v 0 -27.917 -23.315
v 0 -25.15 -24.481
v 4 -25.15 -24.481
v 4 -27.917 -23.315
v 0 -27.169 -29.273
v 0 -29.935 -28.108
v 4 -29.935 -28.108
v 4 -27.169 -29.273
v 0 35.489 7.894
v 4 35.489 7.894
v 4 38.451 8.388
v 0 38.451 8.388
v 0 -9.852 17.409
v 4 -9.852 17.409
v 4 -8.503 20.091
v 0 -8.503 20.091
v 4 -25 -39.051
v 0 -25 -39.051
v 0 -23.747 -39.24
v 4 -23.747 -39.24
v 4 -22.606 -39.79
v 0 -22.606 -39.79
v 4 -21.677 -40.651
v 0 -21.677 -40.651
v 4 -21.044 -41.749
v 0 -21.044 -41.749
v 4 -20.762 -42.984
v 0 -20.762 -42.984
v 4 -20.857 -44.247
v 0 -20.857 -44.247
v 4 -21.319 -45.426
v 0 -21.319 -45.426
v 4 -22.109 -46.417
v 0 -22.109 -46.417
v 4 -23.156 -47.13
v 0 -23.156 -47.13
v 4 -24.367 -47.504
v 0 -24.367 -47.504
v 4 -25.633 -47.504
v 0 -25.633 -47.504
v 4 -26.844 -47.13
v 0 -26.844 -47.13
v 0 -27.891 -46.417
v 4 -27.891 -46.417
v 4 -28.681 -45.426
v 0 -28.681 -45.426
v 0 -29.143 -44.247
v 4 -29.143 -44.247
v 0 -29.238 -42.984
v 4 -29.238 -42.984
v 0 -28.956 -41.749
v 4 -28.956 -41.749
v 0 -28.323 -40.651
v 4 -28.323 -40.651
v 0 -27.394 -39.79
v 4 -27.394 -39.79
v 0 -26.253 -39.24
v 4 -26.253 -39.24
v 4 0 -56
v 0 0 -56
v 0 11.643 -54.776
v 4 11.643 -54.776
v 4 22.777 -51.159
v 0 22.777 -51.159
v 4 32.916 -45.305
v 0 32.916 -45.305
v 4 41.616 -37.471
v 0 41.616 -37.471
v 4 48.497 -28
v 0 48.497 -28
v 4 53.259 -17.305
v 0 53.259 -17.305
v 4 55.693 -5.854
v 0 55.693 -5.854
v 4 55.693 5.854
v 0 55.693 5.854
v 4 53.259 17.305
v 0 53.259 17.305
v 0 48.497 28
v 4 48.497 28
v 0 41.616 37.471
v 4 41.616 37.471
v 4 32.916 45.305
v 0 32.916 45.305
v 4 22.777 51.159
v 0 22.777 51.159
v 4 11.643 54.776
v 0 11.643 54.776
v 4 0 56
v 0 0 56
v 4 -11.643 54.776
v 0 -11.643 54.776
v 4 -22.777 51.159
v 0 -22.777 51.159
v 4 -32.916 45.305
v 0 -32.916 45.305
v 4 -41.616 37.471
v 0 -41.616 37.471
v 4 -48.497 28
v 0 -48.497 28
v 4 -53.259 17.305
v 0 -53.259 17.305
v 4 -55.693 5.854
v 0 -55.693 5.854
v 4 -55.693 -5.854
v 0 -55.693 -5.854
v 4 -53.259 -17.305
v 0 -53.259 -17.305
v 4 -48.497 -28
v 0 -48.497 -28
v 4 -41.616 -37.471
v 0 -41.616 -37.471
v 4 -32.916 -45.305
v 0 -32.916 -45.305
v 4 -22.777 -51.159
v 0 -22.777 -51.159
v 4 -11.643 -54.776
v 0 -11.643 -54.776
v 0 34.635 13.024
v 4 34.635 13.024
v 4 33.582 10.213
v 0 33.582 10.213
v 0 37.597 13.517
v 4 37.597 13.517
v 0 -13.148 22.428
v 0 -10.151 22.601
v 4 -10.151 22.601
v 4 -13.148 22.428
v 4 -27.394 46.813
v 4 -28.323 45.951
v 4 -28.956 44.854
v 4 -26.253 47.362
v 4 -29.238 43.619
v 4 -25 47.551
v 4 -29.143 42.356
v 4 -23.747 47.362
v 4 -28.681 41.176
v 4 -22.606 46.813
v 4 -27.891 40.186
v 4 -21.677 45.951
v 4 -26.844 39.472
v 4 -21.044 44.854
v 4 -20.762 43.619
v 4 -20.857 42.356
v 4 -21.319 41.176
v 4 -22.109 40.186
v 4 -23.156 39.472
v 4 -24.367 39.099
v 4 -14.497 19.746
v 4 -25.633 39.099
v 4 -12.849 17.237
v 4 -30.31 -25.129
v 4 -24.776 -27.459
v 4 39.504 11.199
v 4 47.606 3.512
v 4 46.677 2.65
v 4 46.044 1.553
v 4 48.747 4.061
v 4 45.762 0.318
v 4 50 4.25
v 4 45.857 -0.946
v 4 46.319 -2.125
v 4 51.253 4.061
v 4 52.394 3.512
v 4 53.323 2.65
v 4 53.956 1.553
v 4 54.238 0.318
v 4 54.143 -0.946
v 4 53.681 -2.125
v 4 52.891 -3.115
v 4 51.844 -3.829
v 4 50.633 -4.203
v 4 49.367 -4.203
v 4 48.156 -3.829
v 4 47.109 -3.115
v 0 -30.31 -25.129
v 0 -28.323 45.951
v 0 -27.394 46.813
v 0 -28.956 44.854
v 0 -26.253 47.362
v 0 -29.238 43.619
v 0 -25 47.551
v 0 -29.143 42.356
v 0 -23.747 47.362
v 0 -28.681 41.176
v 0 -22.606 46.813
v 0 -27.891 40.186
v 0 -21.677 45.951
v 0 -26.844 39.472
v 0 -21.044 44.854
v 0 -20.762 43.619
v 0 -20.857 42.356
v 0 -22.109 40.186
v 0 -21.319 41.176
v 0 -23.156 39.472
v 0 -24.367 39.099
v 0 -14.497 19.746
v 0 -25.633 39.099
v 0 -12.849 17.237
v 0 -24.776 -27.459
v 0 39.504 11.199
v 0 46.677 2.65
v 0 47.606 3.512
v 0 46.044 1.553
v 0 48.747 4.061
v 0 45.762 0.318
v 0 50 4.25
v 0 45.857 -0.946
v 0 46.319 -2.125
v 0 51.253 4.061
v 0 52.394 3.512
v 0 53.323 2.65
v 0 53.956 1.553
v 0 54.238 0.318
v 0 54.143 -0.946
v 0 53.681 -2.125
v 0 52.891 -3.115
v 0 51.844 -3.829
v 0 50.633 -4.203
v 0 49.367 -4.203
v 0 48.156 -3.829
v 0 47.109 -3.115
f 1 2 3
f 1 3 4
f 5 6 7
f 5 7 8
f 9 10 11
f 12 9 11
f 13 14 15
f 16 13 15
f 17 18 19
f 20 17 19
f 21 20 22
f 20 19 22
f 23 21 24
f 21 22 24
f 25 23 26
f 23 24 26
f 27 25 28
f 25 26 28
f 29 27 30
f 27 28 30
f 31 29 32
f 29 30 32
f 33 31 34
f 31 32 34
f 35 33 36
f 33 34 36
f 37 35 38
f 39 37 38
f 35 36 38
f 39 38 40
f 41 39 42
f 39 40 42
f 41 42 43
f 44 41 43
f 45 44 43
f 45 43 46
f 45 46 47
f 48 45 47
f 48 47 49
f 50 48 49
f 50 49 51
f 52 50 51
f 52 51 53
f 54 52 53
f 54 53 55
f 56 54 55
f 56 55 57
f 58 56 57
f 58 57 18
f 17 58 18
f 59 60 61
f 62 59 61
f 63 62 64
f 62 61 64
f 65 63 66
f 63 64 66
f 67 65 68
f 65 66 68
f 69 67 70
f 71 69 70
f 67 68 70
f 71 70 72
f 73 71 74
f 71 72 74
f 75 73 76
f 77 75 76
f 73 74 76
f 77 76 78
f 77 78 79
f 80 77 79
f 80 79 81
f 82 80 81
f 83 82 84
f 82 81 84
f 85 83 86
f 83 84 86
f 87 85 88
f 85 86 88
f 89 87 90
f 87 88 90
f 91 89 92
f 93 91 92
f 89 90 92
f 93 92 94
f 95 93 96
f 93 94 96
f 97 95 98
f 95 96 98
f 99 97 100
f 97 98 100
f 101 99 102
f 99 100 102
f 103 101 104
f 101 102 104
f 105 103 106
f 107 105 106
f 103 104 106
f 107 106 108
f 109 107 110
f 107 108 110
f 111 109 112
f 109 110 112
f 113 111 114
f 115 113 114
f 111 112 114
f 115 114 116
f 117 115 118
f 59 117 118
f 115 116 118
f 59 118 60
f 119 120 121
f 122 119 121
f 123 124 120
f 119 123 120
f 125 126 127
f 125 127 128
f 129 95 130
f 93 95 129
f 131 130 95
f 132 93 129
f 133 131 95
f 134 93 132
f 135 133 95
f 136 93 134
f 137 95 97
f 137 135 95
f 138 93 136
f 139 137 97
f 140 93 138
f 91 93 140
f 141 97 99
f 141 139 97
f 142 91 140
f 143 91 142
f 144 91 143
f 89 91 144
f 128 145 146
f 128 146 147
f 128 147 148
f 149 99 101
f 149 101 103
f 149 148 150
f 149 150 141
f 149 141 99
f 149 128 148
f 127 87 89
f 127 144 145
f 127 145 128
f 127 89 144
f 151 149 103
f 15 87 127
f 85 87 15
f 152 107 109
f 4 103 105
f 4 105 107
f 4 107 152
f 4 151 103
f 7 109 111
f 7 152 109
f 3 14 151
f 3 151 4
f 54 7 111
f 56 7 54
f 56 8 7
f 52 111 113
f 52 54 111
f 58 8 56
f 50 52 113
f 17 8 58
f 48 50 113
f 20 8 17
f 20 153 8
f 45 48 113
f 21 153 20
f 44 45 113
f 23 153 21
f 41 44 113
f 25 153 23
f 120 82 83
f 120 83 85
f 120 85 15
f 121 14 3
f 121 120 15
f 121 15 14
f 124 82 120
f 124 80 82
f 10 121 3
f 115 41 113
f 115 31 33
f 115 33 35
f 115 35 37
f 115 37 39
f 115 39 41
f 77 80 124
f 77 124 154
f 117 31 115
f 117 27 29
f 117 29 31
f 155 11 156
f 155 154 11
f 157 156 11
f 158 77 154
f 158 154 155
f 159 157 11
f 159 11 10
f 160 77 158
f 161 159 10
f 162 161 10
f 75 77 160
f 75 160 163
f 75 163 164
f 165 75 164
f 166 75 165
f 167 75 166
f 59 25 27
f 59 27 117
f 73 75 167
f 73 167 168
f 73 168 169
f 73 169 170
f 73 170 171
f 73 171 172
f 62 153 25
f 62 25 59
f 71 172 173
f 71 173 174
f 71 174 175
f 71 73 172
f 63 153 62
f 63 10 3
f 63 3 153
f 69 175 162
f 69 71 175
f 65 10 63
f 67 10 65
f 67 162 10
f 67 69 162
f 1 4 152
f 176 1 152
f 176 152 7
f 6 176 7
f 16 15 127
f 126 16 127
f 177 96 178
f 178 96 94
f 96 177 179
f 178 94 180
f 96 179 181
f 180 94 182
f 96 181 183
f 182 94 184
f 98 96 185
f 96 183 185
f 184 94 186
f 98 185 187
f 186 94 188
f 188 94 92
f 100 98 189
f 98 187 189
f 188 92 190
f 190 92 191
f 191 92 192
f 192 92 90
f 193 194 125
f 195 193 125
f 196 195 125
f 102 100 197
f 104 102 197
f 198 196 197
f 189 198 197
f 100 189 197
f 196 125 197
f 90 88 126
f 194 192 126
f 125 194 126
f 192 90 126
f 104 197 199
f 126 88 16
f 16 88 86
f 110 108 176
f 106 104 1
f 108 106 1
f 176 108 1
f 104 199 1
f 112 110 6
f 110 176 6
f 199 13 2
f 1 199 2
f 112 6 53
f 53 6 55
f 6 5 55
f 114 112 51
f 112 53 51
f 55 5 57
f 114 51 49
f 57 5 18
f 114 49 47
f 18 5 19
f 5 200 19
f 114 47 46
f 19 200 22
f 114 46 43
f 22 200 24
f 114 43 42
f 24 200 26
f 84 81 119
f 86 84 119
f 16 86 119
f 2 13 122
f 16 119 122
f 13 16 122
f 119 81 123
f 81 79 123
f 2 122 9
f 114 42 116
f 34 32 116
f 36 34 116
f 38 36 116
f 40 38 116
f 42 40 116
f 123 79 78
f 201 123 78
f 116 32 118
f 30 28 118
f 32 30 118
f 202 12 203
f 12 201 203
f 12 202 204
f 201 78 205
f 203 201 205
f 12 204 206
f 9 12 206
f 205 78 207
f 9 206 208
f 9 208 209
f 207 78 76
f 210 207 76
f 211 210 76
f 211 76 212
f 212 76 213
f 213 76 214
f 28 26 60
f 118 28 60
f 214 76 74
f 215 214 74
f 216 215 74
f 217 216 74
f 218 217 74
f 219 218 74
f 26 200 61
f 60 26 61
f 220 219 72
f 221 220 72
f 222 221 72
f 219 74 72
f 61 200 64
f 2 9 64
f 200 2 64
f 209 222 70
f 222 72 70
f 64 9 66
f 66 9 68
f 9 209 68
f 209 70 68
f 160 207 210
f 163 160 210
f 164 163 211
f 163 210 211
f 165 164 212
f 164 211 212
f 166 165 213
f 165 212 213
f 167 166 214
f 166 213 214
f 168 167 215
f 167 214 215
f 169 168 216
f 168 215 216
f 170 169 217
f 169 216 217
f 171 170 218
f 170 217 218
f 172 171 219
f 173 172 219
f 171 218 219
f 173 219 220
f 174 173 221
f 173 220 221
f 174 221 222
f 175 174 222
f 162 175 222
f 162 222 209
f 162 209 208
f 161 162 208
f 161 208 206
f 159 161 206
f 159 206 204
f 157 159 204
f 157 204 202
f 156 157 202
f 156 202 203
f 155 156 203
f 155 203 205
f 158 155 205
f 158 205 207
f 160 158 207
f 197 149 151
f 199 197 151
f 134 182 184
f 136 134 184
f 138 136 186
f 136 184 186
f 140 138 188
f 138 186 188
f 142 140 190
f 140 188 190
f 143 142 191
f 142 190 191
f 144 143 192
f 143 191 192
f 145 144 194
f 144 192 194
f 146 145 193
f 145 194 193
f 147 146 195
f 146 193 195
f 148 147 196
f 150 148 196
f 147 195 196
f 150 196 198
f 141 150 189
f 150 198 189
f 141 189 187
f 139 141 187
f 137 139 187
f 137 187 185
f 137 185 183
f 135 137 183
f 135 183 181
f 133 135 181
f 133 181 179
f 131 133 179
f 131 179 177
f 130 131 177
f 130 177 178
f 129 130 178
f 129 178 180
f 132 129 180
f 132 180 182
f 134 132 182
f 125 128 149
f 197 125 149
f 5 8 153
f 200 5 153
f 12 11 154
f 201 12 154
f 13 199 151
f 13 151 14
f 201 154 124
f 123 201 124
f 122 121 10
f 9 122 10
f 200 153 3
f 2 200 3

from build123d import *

# Parameters (mm, degrees)
SKETCH1_R           = 56
BOSS_EXTRUDE1_DEPTH = 4
SKETCH2_R           = 4.25
CUT_EXTRUDE1_DEPTH  = 80.296910406
CUT_EXTRUDE3_DEPTH  = 80.296910406


with BuildPart() as part:
    # Sketch1 → Boss-Extrude1 (new body)
    with BuildSketch(Plane(origin=(0, 0, 0), x_dir=(0, 0, -1), z_dir=(1, 0, 0))):
        Circle(SKETCH1_R)
    extrude(amount=BOSS_EXTRUDE1_DEPTH)

    # Sketch2 → Cut-Extrude1 (cut, through all)
    with BuildSketch(Plane.ZY):
        with Locations((0, 50)):
            Circle(SKETCH2_R)
        with Locations((43.301270189, -25)):
            Circle(SKETCH2_R)
        with Locations((-43.301270189, -25)):
            Circle(SKETCH2_R)
    extrude(amount=-CUT_EXTRUDE1_DEPTH, mode=Mode.SUBTRACT)

    # Sketch4 → Cut-Extrude3 (cut, through all)
    with BuildSketch(Plane(origin=(4, 0, 0), x_dir=(0, 0, -1), z_dir=(1, 0, 0))):
        Polygon((27.459399078, -24.776044357), (24.480611991, -25.150424944), (23.315441547, -27.917320527), (25.12905819, -30.309835523), (28.107845277, -29.935454936), (29.273015721, -27.168559353), align=None)
        Polygon((-13.023850584, 34.635102926), (-10.212575655, 33.581505942), (-7.894496437, 35.489342956), (-8.387692148, 38.450776954), (-11.198967077, 39.504373938), (-13.517046295, 37.596536924), align=None)
        Polygon((-17.236572945, -12.849128791), (-17.40919881, -9.85187444), (-20.091210152, -8.502745649), (-22.600595629, -10.150871209), (-22.427969764, -13.14812556), (-19.745958422, -14.497254351), align=None)
    extrude(amount=-CUT_EXTRUDE3_DEPTH, mode=Mode.SUBTRACT)


solid = part.part
